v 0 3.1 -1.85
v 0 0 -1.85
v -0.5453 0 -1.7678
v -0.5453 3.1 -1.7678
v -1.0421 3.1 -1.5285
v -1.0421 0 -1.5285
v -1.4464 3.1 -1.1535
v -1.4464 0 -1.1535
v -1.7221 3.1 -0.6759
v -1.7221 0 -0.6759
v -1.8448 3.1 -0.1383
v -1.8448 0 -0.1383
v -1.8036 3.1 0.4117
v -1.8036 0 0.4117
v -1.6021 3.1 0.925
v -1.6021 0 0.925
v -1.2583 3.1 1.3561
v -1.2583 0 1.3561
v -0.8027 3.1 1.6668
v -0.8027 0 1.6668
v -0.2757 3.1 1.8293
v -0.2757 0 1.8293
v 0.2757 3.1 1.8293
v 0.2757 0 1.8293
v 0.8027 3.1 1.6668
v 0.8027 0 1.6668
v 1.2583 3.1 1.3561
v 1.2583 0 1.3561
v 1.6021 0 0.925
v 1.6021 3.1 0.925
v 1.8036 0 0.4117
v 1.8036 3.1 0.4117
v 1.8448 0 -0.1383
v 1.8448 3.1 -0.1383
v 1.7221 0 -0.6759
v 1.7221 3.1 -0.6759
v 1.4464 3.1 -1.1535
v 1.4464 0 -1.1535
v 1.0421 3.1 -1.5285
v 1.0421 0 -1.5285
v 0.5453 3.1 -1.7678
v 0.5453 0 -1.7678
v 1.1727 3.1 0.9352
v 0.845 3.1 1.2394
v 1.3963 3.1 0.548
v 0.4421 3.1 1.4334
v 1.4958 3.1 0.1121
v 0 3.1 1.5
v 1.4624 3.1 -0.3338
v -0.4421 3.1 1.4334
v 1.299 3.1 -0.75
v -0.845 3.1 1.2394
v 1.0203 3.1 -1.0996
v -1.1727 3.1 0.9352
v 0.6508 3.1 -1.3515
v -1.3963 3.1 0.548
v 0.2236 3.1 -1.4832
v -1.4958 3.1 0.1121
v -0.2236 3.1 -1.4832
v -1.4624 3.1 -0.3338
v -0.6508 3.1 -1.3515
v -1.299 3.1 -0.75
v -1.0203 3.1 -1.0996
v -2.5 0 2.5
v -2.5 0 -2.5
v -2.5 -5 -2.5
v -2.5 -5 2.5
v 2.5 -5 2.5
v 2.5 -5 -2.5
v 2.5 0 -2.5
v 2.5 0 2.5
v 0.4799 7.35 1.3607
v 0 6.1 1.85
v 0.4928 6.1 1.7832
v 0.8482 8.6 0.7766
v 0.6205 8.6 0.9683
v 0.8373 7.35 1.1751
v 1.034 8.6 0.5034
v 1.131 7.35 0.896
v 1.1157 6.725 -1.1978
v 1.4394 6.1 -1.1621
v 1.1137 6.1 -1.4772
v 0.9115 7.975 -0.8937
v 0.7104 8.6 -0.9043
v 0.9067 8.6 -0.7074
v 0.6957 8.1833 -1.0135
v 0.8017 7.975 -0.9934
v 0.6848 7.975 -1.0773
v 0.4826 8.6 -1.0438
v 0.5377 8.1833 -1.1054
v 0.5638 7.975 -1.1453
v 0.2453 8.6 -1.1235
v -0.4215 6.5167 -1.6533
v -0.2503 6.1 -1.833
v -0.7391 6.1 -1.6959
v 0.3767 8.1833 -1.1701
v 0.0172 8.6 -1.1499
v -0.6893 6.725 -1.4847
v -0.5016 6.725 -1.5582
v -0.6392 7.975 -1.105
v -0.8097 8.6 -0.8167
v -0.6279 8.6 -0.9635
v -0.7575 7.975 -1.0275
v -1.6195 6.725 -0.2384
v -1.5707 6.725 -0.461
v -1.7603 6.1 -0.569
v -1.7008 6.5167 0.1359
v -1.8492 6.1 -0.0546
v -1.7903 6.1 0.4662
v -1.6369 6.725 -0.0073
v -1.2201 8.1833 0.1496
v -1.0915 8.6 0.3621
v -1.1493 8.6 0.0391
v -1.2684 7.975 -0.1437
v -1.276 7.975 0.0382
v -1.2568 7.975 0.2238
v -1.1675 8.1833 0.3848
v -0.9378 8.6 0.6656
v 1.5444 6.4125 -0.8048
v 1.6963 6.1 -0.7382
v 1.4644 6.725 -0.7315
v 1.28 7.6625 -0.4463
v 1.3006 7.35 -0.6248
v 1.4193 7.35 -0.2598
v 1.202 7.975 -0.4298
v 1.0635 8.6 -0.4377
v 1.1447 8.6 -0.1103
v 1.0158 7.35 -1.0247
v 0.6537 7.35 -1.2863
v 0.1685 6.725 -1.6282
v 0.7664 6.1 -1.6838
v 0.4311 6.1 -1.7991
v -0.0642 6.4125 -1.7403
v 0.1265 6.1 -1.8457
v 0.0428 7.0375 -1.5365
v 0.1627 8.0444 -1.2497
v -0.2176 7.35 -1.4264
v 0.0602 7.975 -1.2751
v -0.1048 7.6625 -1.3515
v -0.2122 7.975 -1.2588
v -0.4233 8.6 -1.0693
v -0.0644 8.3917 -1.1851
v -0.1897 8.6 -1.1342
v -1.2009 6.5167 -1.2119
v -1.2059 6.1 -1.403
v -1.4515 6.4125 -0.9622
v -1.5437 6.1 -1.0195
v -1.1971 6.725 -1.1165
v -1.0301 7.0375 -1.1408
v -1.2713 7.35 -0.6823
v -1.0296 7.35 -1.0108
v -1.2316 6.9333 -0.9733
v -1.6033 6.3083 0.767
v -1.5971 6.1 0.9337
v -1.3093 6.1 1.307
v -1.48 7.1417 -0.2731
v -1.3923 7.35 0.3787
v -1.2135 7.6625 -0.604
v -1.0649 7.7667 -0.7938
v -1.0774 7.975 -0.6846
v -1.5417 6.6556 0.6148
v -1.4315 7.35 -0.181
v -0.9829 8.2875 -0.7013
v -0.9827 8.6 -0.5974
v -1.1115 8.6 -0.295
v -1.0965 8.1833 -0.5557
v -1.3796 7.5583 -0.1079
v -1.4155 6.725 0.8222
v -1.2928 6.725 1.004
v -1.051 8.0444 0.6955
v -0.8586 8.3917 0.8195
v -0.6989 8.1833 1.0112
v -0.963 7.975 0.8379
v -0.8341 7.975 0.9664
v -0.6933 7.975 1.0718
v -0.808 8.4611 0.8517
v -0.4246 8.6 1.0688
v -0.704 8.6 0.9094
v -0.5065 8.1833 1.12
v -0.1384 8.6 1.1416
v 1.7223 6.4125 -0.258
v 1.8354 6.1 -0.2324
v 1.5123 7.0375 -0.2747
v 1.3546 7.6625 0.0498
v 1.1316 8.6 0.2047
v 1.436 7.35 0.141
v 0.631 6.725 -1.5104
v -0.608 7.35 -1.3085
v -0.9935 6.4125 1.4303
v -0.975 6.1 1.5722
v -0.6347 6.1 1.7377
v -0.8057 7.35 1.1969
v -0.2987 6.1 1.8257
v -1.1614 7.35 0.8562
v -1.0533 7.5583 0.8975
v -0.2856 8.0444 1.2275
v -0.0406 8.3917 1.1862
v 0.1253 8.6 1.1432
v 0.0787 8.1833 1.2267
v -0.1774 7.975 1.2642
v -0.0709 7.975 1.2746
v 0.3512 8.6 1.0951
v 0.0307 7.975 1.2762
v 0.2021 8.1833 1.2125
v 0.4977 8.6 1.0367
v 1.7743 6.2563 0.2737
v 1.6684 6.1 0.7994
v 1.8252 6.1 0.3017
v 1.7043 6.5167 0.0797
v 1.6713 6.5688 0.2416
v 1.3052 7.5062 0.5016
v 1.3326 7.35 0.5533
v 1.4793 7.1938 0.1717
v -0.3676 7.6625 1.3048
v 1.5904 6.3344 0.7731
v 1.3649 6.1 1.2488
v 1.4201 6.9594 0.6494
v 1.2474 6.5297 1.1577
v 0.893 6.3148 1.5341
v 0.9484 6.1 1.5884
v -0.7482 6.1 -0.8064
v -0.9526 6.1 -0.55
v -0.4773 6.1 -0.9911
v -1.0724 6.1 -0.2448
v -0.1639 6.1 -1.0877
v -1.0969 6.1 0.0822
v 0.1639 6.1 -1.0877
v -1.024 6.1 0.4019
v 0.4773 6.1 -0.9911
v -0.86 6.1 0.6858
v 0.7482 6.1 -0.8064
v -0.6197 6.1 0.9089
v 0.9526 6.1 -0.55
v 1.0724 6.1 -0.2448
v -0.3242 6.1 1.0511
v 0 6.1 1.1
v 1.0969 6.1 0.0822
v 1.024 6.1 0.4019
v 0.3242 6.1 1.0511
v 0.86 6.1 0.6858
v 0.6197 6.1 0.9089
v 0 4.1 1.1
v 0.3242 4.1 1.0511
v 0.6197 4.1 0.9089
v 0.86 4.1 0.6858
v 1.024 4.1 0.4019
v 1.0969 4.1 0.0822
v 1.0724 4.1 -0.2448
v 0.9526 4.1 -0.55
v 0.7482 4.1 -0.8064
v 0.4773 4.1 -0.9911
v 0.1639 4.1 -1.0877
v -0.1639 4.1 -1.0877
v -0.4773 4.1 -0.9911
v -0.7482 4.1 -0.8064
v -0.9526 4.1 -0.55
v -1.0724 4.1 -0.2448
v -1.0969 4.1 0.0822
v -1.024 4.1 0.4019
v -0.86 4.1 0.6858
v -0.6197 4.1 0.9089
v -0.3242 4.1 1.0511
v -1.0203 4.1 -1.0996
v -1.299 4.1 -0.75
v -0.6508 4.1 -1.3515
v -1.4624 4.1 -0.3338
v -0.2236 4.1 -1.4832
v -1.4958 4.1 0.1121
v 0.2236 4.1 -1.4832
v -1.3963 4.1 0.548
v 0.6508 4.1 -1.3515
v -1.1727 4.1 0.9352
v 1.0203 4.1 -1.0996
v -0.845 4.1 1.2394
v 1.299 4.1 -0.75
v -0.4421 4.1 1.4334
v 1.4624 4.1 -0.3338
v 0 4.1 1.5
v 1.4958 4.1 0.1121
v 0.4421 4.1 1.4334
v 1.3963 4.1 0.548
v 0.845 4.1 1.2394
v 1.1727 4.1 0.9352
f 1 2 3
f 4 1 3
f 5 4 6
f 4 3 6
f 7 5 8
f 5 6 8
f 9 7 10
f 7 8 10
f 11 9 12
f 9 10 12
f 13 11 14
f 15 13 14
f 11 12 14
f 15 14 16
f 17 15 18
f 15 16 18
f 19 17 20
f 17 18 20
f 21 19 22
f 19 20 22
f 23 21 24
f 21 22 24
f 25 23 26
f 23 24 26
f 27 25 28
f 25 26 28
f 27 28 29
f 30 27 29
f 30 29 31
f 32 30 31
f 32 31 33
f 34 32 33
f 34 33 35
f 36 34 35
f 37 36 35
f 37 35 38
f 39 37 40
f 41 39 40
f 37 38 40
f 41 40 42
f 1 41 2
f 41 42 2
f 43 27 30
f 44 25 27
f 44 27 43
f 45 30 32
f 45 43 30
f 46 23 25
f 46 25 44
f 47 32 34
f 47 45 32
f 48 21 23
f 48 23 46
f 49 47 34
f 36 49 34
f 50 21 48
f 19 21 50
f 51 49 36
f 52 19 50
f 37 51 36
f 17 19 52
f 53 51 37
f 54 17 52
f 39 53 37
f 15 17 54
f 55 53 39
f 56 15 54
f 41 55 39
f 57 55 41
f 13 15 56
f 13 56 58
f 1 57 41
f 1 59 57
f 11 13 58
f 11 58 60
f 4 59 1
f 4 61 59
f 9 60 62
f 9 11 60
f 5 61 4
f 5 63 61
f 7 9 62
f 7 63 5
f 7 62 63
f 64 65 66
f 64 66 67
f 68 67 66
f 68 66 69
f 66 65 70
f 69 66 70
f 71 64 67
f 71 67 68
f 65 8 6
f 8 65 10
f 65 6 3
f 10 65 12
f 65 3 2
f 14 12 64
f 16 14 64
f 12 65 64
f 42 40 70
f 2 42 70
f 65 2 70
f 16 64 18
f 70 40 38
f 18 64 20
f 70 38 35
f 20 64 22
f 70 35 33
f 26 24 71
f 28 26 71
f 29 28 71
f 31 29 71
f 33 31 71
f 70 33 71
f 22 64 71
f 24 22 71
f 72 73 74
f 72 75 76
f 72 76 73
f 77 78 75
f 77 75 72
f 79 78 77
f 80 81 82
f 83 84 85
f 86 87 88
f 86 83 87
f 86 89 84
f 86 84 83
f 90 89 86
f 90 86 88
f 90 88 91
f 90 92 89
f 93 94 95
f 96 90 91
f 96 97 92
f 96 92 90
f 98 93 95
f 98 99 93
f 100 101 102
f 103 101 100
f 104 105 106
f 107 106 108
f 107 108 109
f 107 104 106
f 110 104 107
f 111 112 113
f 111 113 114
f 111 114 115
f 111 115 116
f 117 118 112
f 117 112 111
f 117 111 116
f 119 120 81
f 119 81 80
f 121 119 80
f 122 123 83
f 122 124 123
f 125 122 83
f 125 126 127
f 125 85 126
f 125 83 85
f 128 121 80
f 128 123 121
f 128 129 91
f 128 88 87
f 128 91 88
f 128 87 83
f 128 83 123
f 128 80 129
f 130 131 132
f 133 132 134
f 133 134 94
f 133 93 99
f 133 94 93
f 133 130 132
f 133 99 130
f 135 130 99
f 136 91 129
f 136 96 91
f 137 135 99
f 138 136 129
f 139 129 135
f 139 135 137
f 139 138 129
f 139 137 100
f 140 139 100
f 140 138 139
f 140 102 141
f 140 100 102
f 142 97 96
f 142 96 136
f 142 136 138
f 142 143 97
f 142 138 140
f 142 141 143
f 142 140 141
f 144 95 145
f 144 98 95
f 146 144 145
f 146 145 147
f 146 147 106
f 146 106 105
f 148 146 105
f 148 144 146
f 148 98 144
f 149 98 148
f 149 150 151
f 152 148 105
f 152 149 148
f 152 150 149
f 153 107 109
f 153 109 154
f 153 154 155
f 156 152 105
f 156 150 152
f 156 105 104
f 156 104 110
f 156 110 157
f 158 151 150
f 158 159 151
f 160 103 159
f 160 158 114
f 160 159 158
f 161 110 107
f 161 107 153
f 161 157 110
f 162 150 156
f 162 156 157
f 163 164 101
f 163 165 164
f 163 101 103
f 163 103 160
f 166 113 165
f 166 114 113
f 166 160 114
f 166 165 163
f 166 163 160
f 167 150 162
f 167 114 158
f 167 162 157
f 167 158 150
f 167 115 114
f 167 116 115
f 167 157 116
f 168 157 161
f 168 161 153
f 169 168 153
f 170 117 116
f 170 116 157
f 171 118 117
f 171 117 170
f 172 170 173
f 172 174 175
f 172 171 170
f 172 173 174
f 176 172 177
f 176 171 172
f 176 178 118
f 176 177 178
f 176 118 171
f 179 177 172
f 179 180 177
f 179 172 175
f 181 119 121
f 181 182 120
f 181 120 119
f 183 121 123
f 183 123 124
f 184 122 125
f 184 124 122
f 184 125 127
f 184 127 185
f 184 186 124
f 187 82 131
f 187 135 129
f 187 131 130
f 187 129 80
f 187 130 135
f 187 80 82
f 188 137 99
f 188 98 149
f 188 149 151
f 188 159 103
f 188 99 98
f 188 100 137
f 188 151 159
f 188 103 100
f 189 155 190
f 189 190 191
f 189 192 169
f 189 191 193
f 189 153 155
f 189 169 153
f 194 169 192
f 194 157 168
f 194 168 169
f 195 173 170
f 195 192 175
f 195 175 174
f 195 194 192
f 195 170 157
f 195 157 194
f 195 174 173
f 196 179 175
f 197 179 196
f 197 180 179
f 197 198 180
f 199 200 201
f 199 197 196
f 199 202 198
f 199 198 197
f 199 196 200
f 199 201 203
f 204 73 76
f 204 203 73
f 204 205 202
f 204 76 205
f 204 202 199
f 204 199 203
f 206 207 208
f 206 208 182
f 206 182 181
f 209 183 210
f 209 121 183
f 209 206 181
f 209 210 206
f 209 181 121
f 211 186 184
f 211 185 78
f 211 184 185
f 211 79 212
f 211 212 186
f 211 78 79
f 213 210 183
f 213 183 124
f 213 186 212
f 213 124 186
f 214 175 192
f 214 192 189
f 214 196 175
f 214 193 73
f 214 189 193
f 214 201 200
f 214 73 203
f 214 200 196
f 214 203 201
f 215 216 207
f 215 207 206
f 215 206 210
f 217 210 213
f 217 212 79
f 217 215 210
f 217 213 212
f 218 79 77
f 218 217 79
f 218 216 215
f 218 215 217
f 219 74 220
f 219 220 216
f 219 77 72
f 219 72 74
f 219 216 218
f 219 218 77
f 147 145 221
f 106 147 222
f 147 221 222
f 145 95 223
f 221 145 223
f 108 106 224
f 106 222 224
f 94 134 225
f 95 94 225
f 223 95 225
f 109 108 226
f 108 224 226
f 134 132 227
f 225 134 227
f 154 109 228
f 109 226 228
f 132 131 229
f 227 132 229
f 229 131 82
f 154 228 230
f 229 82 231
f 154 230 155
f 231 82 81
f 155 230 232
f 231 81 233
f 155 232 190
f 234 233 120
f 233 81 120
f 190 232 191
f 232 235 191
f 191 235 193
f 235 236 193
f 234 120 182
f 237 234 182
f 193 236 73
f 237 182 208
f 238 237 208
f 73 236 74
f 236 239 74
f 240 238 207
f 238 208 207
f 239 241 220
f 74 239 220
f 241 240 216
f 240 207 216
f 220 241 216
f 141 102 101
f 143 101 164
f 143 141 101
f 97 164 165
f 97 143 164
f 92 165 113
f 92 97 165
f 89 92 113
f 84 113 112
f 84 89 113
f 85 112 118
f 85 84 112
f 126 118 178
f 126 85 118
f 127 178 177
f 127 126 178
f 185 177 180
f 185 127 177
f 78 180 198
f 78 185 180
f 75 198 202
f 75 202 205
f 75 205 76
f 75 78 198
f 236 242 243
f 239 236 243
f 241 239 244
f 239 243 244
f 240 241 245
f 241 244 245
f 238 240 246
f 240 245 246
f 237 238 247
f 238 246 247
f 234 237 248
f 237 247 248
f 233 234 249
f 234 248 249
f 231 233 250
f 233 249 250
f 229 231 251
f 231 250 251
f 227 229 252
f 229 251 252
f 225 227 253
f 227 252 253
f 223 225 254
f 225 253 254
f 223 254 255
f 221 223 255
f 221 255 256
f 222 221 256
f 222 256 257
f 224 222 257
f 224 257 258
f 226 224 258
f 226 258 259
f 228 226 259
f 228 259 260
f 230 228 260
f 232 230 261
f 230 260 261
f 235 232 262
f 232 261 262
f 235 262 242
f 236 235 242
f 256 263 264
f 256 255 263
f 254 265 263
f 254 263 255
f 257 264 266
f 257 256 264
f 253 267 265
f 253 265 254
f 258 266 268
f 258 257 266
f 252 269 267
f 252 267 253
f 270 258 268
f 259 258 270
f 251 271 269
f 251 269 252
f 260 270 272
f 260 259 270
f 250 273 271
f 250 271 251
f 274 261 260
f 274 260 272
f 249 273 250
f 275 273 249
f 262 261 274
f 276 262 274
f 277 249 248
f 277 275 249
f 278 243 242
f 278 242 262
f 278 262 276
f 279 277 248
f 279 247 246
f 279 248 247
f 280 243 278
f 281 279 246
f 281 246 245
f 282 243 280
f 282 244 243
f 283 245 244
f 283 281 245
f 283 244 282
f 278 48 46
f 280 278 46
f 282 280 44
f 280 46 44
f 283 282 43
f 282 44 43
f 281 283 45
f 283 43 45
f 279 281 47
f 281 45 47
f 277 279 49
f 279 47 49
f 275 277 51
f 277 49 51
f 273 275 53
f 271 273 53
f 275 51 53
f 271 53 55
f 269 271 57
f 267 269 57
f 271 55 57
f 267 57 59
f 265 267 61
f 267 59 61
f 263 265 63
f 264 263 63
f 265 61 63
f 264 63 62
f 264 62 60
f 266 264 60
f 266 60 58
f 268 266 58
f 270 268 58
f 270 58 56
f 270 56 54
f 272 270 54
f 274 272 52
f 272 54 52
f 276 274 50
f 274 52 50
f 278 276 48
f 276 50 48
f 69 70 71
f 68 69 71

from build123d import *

# Parameters (mm, degrees)
SKETCH1_R           = 1.85
BOSS_EXTRUDE1_DEPTH = 3.1
SKETCH2_R           = 1.5
BOSS_EXTRUDE2_DEPTH = 1
SKETCH3_R           = 1.1
BOSS_EXTRUDE3_DEPTH = 2
SKETCH6_W           = 5
SKETCH6_H           = 5
BOSS_EXTRUDE4_DEPTH = 5


with BuildPart() as part:
    # Sketch1 → Boss-Extrude1 (new body)
    with BuildSketch(Plane(origin=(0, 0, 0), x_dir=(1, 0, 0), z_dir=(0, 1, 0))):
        with Locations(Location((0, 0, 0), (0, 0, 90))):
            Circle(SKETCH1_R)
    extrude(amount=BOSS_EXTRUDE1_DEPTH)

    # Sketch2 → Boss-Extrude2 (add)
    with BuildSketch(Plane(origin=(0, 3.1, 0), x_dir=(1, 0, 0), z_dir=(0, 1, 0))):
        with Locations(Location((0, 0, 0), (0, 0, 270))):
            Circle(SKETCH2_R)
    extrude(amount=BOSS_EXTRUDE2_DEPTH)

    # Sketch3 → Boss-Extrude3 (add)
    with BuildSketch(Plane(origin=(0, 4.1, 0), x_dir=(1, 0, 0), z_dir=(0, 1, 0))):
        with Locations(Location((0, 0, 0), (0, 0, 270))):
            Circle(SKETCH3_R)
    extrude(amount=BOSS_EXTRUDE3_DEPTH)

    # Loft1: read off the stored shape, not the designer's step
    # Loft1: loft between two sections, ruled curve by curve
    loft1_from = [
        Edge.make_bspline([(0, 6.1, 1.85), (3.7, 6.1, 1.85), (3.7, 6.1, -1.85), (0, 6.1, -1.85), (-3.7, 6.1, -1.85), (-3.7, 6.1, 1.85), (0, 6.1, 1.85)], [0, 0, 0, 0, 0.5, 0.5, 0.5, 1, 1, 1, 1], 3, [1, 0.333333333, 0.333333333, 1, 0.333333333, 0.333333333, 1]),
    ]
    loft1_to = [
        Edge.make_bspline([(0.620465421, 8.6, 0.968257539), (2.556980499, 8.6, -0.272673303), (1.316049657, 8.6, -2.209188381), (-0.620465421, 8.6, -0.968257539), (-2.556980499, 8.6, 0.272673303), (-1.316049657, 8.6, 2.209188381), (0.620465421, 8.6, 0.968257539)], [0, 0, 0, 0, 0.5, 0.5, 0.5, 1, 1, 1, 1], 3, [1, 0.333333333, 0.333333333, 1, 0.333333333, 0.333333333, 1]),
    ]
    loft1 = Solid(Shell([*[Face.make_surface_from_curves(loft1_from[k], loft1_to[k]) for k in range(1)], Face(Wire(loft1_from)), Face(Wire(loft1_to))]))
    add(loft1)

    # Sketch6 → Boss-Extrude4 (add)
    with BuildSketch(Plane.XZ):
        Rectangle(SKETCH6_W, SKETCH6_H)
    extrude(amount=BOSS_EXTRUDE4_DEPTH)


solid = part.part
